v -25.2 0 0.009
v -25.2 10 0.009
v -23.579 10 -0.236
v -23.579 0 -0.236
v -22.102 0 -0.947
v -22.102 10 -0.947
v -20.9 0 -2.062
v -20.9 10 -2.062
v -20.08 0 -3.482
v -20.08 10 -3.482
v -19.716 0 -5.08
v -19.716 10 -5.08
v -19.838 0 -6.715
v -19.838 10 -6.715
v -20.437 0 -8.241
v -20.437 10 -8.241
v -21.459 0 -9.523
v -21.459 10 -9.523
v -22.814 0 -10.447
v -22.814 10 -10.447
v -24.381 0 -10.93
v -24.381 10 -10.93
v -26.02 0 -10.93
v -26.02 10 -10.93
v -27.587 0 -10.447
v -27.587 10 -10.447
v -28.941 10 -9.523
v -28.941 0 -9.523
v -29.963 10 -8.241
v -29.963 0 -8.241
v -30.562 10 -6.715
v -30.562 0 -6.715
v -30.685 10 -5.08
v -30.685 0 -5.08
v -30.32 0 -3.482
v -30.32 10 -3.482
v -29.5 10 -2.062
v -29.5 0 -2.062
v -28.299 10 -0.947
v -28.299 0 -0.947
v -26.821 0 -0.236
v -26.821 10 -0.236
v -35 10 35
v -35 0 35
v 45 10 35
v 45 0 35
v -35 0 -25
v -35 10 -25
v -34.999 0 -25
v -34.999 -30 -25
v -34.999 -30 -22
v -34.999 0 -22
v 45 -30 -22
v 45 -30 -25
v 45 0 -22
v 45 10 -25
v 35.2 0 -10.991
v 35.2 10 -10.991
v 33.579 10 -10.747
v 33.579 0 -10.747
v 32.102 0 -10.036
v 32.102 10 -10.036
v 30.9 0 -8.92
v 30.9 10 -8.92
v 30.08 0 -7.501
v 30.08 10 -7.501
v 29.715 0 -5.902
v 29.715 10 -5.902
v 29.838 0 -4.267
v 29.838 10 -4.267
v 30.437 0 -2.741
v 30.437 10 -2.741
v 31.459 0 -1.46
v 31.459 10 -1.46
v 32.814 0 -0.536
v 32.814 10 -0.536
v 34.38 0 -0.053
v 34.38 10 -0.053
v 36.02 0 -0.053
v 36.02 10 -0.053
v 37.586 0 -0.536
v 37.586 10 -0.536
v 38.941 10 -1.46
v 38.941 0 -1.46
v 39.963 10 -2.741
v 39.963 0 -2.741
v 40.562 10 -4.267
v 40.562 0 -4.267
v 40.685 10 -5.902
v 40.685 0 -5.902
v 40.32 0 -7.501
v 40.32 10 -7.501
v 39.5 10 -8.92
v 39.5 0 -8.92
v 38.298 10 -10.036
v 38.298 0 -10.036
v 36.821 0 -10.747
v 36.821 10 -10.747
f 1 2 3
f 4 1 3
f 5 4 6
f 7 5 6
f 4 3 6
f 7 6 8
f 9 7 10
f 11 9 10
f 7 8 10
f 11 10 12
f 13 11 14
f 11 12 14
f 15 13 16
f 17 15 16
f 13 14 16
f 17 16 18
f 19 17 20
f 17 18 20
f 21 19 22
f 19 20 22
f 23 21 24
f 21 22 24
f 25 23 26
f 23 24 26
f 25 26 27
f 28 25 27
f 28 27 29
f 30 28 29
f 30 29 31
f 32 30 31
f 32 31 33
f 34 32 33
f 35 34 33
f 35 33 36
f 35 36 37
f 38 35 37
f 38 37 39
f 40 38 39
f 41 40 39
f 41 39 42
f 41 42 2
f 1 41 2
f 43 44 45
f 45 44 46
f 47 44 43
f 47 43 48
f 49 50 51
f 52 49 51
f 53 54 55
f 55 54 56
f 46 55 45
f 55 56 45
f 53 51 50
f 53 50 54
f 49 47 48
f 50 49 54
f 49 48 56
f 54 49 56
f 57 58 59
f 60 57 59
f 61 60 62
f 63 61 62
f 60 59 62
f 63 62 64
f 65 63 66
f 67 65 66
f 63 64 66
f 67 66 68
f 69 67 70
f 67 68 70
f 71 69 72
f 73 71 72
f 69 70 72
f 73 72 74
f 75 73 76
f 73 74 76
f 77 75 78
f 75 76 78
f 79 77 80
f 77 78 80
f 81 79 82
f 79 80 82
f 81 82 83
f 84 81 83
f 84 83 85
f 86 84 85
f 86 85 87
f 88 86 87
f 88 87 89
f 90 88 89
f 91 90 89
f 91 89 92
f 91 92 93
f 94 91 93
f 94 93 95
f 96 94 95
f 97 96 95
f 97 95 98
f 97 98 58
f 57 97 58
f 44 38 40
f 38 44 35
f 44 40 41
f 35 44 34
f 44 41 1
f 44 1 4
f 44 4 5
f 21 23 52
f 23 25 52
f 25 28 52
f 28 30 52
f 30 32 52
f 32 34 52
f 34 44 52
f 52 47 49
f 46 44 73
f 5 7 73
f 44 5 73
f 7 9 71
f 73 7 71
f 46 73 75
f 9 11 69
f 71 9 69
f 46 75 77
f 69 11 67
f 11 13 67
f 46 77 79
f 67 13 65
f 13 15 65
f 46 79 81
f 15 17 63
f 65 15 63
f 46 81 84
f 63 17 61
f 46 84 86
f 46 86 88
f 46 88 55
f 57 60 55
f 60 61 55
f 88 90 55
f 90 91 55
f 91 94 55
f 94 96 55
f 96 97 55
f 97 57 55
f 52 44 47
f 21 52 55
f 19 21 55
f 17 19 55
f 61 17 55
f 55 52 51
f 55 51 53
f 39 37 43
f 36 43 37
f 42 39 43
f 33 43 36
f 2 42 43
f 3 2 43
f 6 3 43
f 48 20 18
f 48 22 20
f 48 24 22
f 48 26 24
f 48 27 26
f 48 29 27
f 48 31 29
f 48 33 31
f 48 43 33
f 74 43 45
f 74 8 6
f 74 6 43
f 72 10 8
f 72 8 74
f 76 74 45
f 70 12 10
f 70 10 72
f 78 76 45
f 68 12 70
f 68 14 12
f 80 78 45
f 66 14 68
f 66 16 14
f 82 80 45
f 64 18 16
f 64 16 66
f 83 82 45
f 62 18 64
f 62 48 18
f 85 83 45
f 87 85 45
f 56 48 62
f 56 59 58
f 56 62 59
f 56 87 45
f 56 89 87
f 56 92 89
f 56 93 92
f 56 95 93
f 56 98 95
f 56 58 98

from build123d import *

# Parameters (mm, degrees)
SKETCH1_W           = 80
SKETCH1_H           = 60
BOSS_EXTRUDE1_DEPTH = 10
SKETCH2_R           = 5.5
CUT_EXTRUDE1_DEPTH  = 58.879184514
SKETCH3_W           = 79.999469754
SKETCH3_H           = 3
BOSS_EXTRUDE2_DEPTH = 30


with BuildPart() as part:
    # Sketch1 → Boss-Extrude1 (new body)
    with BuildSketch(Plane(origin=(0, 0, 0), x_dir=(1, 0, 0), z_dir=(0, 1, 0))):
        with Locations((5, -5)):
            Rectangle(SKETCH1_W, SKETCH1_H)
    extrude(amount=BOSS_EXTRUDE1_DEPTH)

    # Sketch2 → Cut-Extrude1 (cut, through all)
    with BuildSketch(Plane(origin=(0, 10, 0), x_dir=(1, 0, 0), z_dir=(0, 1, 0))):
        with Locations(Location((-25.20025306, 5.49130346, 0), (0, 0, 270))):
            Circle(SKETCH2_R)
        with Locations(Location((35.2, 5.49130346, 0), (0, 0, 90))):
            Circle(SKETCH2_R)
    extrude(amount=-CUT_EXTRUDE1_DEPTH, mode=Mode.SUBTRACT)

    # Sketch3 → Boss-Extrude2 (add)
    with BuildSketch(Plane.XZ):
        with Locations((5.000265123, -23.5)):
            Rectangle(SKETCH3_W, SKETCH3_H)
    extrude(amount=BOSS_EXTRUDE2_DEPTH)


solid = part.part
